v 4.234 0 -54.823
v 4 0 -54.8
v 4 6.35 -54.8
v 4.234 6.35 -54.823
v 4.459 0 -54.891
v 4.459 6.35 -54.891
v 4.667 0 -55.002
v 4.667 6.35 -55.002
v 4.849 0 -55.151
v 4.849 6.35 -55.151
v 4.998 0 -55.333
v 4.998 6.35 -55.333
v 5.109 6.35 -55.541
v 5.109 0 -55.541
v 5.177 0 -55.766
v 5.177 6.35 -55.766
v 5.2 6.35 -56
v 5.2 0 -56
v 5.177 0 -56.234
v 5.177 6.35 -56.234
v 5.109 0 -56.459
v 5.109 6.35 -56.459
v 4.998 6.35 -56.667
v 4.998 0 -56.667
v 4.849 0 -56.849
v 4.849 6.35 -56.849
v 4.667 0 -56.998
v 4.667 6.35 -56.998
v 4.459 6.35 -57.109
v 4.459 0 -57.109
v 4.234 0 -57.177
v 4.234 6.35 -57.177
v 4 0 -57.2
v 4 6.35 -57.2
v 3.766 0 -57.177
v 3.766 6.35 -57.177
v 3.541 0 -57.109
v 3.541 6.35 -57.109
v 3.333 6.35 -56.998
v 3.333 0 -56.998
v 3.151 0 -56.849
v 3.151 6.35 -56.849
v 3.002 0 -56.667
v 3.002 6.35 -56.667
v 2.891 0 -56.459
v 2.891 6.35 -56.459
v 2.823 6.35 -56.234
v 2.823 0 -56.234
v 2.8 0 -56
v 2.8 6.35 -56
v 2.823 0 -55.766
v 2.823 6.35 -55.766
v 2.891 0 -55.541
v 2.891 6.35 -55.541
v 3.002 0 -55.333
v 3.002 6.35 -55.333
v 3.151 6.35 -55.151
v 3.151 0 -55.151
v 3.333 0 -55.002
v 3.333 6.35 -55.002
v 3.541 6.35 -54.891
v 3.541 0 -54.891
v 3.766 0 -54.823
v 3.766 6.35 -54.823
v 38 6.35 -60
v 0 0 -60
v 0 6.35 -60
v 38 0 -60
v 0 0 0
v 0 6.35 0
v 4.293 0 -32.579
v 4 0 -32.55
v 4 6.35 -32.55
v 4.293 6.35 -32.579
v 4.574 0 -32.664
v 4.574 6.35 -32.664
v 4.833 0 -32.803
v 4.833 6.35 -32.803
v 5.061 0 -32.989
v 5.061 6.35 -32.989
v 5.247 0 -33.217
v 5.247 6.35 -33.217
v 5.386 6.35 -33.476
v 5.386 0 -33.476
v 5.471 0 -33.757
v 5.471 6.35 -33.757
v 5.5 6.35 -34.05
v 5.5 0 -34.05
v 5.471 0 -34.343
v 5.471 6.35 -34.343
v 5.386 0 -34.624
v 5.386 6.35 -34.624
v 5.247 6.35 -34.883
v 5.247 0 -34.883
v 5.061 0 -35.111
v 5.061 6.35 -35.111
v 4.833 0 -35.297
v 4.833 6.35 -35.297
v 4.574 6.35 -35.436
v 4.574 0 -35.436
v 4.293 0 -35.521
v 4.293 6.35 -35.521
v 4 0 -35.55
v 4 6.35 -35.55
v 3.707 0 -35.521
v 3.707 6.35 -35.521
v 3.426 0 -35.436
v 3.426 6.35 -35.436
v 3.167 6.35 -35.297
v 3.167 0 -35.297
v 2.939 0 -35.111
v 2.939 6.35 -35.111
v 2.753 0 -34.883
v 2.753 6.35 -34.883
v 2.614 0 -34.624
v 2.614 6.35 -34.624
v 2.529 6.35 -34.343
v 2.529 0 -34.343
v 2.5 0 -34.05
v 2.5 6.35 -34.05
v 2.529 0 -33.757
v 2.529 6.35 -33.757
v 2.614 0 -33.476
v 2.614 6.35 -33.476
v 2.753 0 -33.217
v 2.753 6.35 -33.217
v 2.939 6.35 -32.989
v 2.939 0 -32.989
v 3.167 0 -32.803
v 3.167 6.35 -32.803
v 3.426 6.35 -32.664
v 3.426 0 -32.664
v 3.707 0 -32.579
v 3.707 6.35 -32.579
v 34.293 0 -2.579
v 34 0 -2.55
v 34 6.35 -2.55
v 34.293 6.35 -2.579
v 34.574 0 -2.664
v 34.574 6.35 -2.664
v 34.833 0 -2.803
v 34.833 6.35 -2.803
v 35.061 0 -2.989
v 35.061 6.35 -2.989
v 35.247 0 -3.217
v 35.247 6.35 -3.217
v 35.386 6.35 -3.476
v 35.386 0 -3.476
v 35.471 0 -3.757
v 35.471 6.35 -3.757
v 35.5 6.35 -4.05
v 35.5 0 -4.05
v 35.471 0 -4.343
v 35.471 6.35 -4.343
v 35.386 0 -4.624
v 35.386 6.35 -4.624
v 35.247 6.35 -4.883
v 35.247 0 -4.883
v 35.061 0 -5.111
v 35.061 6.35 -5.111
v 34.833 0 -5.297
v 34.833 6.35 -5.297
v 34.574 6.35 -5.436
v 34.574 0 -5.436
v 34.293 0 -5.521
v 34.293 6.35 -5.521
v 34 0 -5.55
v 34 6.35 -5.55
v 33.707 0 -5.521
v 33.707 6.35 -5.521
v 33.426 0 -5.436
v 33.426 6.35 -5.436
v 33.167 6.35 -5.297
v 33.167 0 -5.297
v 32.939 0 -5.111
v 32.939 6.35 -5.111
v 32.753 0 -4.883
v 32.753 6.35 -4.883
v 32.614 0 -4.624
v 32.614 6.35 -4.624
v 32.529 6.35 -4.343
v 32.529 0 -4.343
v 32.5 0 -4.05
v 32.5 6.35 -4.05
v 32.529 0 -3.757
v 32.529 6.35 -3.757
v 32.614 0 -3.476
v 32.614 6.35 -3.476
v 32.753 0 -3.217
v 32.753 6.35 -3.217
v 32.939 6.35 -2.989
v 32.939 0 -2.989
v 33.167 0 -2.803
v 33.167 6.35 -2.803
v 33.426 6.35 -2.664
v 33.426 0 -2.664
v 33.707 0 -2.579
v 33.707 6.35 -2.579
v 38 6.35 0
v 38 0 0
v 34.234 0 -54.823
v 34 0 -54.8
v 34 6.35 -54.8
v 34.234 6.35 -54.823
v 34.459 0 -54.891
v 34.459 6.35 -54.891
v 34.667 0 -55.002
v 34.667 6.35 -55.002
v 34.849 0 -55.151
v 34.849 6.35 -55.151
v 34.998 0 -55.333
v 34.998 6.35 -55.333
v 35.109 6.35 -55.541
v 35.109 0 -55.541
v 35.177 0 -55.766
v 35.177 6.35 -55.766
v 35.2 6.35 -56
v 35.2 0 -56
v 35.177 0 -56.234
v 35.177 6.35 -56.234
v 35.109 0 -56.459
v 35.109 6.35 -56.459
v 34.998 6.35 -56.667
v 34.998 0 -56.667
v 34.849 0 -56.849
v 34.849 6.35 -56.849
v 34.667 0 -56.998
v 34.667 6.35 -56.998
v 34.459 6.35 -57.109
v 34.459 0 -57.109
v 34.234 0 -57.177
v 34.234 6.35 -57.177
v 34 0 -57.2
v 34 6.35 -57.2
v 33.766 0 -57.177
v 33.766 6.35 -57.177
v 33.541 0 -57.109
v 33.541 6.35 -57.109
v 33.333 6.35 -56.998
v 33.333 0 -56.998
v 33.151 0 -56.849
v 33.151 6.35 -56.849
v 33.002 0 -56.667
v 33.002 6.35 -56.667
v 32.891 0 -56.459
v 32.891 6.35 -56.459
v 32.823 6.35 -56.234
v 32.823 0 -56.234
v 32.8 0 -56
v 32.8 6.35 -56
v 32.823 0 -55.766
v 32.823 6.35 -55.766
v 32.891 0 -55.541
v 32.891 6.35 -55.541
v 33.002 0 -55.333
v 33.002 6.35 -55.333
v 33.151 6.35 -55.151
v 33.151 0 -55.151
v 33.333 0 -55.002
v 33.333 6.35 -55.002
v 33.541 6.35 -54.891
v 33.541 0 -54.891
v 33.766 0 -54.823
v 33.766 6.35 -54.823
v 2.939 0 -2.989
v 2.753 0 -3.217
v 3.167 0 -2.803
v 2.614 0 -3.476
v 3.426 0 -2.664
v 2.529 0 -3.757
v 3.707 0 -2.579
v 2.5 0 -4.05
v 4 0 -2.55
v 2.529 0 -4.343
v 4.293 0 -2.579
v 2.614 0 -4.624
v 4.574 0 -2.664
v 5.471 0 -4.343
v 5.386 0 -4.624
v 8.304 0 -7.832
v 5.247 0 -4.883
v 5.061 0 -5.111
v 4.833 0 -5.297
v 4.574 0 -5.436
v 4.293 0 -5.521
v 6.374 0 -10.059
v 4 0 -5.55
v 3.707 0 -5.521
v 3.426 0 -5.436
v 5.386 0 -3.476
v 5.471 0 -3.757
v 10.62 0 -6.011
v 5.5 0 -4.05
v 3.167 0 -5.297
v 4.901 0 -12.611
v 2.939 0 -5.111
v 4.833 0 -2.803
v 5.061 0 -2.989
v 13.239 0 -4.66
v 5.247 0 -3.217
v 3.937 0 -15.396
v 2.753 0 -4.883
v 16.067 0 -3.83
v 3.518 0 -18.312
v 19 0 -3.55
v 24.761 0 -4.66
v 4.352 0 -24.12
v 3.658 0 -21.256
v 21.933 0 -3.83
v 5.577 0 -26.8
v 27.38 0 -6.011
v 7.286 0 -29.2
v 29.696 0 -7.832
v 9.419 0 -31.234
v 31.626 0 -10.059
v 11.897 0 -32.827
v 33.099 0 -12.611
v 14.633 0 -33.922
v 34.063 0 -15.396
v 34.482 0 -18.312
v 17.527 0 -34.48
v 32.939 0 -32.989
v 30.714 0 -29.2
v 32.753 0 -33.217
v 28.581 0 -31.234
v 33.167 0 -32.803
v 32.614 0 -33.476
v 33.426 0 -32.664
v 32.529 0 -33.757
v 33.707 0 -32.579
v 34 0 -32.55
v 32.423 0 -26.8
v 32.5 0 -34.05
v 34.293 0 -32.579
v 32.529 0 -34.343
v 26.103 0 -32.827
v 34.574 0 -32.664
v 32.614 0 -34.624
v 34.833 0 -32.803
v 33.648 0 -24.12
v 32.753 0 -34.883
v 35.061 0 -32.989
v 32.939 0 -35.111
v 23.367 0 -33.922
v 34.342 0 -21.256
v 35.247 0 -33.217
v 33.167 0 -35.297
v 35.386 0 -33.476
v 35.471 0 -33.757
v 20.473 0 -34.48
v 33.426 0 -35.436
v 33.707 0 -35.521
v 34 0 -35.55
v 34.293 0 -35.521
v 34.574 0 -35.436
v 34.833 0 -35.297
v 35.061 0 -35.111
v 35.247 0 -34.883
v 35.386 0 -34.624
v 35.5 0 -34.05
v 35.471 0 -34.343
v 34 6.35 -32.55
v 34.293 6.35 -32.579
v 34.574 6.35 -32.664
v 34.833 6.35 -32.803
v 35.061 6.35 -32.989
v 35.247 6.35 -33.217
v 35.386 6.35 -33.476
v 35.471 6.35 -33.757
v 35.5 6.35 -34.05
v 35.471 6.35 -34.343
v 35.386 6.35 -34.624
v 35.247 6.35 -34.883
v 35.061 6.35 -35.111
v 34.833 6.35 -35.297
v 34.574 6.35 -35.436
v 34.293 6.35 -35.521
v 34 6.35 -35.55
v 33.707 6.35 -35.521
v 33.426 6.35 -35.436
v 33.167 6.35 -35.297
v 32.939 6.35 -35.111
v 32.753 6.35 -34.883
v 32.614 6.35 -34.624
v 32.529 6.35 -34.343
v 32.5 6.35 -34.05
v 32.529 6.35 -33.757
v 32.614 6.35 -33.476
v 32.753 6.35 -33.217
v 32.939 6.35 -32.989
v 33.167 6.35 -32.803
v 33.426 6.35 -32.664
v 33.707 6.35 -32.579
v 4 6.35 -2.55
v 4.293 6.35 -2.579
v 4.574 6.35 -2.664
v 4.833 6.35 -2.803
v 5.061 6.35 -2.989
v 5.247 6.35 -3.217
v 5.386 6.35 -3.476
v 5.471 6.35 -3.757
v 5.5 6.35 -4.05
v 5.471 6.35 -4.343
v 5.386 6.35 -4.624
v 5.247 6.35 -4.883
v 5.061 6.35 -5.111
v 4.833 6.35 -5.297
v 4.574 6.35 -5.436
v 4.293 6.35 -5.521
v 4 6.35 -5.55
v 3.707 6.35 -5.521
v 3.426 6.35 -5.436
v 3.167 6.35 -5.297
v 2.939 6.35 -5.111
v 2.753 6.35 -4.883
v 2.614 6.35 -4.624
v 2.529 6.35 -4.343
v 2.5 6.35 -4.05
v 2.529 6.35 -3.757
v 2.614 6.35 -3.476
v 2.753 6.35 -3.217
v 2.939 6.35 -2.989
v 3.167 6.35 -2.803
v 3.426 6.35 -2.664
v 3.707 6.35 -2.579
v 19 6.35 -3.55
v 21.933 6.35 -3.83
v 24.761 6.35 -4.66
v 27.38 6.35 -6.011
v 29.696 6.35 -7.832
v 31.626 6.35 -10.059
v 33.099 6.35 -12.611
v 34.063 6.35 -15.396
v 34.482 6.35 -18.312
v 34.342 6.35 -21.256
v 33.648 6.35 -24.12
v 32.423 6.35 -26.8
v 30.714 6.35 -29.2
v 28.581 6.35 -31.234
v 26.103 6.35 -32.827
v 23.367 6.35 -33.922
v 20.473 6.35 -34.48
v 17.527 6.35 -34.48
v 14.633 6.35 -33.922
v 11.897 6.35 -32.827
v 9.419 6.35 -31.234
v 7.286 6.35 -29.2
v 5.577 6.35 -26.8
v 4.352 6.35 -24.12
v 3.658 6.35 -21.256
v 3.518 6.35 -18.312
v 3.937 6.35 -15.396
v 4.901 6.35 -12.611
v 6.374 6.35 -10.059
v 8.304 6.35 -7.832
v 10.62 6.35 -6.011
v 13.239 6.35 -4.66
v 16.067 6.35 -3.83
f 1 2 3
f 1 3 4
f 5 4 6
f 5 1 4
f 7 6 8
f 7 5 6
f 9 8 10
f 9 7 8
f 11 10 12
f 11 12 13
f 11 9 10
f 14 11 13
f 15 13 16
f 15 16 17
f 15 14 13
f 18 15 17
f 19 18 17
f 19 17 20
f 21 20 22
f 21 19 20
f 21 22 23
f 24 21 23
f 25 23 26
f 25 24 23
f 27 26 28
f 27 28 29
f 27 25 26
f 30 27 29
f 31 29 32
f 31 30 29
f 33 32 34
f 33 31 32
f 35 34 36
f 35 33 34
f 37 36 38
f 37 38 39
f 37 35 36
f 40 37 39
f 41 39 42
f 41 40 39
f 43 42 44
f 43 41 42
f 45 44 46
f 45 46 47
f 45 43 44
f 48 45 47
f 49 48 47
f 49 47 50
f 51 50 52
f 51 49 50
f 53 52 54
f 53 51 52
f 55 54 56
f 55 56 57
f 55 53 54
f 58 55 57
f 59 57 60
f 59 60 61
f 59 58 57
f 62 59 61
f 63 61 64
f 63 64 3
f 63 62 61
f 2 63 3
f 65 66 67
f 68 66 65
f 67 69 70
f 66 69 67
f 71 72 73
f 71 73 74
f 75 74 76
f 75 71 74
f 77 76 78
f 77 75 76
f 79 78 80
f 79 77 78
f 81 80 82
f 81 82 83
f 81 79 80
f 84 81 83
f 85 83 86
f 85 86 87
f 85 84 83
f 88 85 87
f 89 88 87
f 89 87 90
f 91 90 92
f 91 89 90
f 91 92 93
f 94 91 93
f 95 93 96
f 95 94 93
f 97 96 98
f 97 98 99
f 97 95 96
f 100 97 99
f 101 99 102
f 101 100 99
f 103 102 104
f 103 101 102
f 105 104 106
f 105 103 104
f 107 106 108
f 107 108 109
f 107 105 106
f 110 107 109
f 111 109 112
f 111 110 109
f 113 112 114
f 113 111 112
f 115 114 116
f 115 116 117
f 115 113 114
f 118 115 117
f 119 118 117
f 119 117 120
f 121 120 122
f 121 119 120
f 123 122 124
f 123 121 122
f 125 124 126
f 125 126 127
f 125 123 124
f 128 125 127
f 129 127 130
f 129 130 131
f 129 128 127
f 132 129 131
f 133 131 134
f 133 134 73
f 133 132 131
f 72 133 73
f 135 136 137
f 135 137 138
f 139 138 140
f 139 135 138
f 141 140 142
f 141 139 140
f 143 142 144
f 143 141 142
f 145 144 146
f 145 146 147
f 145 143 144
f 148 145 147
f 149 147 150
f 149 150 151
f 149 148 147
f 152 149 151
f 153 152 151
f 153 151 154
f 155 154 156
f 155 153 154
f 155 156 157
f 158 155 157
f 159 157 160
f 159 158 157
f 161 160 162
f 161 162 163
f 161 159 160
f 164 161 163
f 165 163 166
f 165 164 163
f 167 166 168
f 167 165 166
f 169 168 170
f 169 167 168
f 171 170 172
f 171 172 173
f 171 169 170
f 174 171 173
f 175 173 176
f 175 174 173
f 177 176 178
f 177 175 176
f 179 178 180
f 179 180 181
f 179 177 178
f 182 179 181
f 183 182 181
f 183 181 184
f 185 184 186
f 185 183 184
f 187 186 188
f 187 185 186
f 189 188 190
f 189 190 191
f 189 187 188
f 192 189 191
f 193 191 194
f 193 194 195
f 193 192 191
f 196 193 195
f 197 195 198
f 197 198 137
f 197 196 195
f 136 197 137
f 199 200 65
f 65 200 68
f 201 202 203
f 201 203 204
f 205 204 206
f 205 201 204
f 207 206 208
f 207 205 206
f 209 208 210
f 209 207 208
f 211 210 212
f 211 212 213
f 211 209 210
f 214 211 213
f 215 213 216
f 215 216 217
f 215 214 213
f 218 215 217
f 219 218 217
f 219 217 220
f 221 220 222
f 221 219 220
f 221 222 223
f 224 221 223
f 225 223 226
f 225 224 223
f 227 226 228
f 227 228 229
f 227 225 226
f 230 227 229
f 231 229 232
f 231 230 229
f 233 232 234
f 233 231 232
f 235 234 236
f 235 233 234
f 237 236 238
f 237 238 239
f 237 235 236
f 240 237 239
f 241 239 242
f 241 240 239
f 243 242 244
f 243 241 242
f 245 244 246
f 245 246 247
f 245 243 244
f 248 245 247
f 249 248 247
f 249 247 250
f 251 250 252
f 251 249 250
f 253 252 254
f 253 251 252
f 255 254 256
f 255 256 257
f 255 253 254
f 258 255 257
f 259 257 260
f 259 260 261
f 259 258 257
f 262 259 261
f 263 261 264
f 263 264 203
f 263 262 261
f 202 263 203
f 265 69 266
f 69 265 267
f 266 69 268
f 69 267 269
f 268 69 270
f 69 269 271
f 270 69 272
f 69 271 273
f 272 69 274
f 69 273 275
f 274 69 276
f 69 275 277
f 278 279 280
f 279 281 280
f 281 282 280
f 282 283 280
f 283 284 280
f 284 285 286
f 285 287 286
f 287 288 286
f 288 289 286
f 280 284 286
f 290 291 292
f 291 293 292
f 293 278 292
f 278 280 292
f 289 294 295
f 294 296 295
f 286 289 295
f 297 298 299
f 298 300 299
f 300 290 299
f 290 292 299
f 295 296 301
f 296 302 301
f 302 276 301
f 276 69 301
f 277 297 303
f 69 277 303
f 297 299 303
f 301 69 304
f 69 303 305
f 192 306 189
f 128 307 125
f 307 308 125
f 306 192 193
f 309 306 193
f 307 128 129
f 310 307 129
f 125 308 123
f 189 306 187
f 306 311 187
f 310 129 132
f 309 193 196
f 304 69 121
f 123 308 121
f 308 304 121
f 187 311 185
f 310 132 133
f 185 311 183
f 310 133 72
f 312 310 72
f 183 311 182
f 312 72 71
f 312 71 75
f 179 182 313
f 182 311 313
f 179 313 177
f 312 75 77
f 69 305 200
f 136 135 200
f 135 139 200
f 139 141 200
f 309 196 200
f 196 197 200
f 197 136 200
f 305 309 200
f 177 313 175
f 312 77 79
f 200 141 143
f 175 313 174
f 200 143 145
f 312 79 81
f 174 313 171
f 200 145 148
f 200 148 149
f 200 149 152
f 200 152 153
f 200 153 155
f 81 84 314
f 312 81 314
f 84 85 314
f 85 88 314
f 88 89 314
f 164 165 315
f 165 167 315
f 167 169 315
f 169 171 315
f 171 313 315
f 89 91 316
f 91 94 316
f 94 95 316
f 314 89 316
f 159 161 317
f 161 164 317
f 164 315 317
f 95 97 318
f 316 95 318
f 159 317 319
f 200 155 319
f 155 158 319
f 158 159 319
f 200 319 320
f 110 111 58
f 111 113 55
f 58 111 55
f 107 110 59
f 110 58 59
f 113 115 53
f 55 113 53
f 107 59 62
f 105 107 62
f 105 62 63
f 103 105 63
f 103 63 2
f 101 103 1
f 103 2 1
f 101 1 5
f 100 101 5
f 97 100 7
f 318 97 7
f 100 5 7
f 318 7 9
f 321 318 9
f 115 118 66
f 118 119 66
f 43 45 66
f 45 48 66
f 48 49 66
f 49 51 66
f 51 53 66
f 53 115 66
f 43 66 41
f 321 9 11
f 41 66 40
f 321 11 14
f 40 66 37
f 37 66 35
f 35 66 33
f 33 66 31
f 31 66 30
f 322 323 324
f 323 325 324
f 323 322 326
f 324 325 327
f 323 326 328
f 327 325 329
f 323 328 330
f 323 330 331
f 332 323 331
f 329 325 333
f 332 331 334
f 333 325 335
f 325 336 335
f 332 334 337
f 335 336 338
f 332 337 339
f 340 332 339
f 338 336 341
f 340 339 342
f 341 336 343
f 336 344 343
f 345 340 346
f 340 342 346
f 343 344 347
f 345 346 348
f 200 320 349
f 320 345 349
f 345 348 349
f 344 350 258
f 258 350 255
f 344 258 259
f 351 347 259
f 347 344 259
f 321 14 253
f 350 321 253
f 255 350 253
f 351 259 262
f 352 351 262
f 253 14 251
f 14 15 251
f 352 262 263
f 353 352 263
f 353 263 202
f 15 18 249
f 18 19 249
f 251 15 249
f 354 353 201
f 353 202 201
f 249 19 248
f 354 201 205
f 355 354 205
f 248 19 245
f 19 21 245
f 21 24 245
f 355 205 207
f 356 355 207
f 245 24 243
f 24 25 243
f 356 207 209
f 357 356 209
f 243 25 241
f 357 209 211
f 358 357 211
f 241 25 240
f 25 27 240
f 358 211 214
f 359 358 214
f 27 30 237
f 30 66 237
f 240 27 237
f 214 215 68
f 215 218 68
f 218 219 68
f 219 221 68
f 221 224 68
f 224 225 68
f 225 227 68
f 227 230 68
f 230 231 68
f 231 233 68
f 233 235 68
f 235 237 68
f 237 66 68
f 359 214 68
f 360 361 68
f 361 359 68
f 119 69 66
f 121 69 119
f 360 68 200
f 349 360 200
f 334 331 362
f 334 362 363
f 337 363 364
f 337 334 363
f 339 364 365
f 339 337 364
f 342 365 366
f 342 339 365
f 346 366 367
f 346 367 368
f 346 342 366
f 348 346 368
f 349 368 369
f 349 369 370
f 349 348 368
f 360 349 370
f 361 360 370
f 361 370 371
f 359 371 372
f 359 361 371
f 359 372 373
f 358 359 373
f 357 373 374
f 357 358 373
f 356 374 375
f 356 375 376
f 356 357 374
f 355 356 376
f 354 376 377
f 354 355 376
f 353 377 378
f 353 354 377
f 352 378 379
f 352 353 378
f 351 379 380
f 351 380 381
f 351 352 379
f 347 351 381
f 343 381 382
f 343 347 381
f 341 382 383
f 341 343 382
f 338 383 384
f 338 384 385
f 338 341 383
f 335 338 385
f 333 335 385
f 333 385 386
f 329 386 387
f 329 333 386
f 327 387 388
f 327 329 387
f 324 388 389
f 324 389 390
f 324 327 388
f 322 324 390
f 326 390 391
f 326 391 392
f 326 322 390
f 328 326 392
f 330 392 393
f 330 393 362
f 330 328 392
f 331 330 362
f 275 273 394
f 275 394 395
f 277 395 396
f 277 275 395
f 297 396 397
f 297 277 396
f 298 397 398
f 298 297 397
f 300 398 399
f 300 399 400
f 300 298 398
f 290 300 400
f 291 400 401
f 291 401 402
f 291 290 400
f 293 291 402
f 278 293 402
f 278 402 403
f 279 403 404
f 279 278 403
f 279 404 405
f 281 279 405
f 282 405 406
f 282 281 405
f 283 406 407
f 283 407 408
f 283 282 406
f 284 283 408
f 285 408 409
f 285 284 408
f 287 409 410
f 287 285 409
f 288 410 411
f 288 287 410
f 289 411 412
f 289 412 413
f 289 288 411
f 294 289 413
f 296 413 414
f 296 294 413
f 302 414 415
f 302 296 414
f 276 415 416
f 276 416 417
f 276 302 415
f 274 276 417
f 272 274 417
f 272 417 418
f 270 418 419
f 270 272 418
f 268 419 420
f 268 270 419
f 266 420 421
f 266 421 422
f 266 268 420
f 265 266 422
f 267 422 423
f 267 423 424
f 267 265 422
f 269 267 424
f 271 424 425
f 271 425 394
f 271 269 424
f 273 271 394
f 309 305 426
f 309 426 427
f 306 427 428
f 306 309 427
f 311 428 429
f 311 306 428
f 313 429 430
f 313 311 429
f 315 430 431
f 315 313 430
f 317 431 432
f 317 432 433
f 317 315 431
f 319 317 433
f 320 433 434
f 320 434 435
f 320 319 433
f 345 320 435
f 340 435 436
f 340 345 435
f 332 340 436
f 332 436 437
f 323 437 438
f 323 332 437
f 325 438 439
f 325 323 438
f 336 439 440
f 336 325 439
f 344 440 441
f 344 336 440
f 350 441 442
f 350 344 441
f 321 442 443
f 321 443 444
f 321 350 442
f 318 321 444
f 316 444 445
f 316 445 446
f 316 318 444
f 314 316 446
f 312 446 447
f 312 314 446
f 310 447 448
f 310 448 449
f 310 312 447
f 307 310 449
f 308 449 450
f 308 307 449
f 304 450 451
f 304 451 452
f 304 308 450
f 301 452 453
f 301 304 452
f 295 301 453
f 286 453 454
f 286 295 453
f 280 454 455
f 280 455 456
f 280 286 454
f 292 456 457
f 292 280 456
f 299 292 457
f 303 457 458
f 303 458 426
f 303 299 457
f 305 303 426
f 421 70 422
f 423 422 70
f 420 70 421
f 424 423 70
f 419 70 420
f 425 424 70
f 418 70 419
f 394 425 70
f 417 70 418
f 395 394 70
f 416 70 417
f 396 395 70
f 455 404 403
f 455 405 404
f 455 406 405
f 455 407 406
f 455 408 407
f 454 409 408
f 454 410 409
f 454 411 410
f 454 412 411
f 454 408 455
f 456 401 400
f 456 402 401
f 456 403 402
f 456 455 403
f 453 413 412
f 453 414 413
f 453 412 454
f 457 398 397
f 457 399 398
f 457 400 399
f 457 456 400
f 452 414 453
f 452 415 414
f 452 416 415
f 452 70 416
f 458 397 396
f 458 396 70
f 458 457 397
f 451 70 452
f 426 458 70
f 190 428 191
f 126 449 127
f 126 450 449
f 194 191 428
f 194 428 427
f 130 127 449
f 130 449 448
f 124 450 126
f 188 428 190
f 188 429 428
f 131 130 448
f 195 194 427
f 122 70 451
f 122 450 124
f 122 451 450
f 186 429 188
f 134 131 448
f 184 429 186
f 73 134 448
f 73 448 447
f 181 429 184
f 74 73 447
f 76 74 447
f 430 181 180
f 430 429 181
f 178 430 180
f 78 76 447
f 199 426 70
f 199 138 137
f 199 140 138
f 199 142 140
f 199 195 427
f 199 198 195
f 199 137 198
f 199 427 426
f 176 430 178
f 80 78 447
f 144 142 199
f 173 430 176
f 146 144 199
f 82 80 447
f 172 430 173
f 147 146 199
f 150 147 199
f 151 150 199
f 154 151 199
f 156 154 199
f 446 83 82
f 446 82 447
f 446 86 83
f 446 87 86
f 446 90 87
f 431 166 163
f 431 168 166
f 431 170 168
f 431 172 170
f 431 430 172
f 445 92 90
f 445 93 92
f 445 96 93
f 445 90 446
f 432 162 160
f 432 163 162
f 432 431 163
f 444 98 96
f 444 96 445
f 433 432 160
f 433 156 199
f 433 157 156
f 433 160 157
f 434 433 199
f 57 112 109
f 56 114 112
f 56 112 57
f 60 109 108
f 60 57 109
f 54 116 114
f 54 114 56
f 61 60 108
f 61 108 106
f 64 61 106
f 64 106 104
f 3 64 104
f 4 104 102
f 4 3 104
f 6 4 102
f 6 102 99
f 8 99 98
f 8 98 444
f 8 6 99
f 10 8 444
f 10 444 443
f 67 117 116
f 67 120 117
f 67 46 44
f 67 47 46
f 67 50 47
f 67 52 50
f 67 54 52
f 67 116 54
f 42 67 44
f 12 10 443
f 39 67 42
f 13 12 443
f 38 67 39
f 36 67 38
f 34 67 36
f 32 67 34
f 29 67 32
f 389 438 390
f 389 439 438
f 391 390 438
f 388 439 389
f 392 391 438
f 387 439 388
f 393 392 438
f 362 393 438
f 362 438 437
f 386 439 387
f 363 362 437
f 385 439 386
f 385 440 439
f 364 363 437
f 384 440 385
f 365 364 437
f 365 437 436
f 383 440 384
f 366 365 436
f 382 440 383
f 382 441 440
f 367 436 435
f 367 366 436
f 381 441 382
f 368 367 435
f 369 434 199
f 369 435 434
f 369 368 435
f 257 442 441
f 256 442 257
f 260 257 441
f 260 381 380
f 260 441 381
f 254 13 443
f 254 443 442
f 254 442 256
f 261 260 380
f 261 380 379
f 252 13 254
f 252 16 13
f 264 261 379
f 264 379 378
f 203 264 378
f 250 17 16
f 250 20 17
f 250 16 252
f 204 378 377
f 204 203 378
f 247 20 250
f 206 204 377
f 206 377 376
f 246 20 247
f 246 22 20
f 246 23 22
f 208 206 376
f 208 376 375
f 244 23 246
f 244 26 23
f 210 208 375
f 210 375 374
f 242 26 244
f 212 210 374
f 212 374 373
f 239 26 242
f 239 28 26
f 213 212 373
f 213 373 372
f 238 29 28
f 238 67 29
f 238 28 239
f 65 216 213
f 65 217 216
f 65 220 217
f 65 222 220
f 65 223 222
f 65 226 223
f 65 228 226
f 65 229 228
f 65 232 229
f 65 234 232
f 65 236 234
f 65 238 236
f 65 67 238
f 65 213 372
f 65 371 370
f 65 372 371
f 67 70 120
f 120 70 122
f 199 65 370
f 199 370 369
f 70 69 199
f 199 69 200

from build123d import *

# Parameters (mm, degrees)
SKETCH1_W           = 38
SKETCH1_H           = 60
SKETCH1_R           = 1.5
SKETCH1_R_2         = 15.5
SKETCH1_R_3         = 1.2
BOSS_EXTRUDE1_DEPTH = 6.35


with BuildPart() as part:
    # Sketch1 → Boss-Extrude1 (new body)
    with BuildSketch(Plane(origin=(0, 0, 0), x_dir=(1, 0, 0), z_dir=(0, 1, 0))):
        with Locations((19, 30)):
            Rectangle(SKETCH1_W, SKETCH1_H)
        with Locations(Location((4, 4.05, 0), (0, 0, 270))):
            Circle(SKETCH1_R, mode=Mode.SUBTRACT)
        with Locations(Location((34, 4.05, 0), (0, 0, 270))):
            Circle(SKETCH1_R, mode=Mode.SUBTRACT)
        with Locations(Location((34, 34.05, 0), (0, 0, 270))):
            Circle(SKETCH1_R, mode=Mode.SUBTRACT)
        with Locations(Location((4, 34.05, 0), (0, 0, 270))):
            Circle(SKETCH1_R, mode=Mode.SUBTRACT)
        with Locations(Location((19, 19.05, 0), (0, 0, 270))):
            Circle(SKETCH1_R_2, mode=Mode.SUBTRACT)
        with Locations(Location((4, 56, 0), (0, 0, 270))):
            Circle(SKETCH1_R_3, mode=Mode.SUBTRACT)
        with Locations(Location((34, 56, 0), (0, 0, 270))):
            Circle(SKETCH1_R_3, mode=Mode.SUBTRACT)
    extrude(amount=BOSS_EXTRUDE1_DEPTH)


solid = part.part
